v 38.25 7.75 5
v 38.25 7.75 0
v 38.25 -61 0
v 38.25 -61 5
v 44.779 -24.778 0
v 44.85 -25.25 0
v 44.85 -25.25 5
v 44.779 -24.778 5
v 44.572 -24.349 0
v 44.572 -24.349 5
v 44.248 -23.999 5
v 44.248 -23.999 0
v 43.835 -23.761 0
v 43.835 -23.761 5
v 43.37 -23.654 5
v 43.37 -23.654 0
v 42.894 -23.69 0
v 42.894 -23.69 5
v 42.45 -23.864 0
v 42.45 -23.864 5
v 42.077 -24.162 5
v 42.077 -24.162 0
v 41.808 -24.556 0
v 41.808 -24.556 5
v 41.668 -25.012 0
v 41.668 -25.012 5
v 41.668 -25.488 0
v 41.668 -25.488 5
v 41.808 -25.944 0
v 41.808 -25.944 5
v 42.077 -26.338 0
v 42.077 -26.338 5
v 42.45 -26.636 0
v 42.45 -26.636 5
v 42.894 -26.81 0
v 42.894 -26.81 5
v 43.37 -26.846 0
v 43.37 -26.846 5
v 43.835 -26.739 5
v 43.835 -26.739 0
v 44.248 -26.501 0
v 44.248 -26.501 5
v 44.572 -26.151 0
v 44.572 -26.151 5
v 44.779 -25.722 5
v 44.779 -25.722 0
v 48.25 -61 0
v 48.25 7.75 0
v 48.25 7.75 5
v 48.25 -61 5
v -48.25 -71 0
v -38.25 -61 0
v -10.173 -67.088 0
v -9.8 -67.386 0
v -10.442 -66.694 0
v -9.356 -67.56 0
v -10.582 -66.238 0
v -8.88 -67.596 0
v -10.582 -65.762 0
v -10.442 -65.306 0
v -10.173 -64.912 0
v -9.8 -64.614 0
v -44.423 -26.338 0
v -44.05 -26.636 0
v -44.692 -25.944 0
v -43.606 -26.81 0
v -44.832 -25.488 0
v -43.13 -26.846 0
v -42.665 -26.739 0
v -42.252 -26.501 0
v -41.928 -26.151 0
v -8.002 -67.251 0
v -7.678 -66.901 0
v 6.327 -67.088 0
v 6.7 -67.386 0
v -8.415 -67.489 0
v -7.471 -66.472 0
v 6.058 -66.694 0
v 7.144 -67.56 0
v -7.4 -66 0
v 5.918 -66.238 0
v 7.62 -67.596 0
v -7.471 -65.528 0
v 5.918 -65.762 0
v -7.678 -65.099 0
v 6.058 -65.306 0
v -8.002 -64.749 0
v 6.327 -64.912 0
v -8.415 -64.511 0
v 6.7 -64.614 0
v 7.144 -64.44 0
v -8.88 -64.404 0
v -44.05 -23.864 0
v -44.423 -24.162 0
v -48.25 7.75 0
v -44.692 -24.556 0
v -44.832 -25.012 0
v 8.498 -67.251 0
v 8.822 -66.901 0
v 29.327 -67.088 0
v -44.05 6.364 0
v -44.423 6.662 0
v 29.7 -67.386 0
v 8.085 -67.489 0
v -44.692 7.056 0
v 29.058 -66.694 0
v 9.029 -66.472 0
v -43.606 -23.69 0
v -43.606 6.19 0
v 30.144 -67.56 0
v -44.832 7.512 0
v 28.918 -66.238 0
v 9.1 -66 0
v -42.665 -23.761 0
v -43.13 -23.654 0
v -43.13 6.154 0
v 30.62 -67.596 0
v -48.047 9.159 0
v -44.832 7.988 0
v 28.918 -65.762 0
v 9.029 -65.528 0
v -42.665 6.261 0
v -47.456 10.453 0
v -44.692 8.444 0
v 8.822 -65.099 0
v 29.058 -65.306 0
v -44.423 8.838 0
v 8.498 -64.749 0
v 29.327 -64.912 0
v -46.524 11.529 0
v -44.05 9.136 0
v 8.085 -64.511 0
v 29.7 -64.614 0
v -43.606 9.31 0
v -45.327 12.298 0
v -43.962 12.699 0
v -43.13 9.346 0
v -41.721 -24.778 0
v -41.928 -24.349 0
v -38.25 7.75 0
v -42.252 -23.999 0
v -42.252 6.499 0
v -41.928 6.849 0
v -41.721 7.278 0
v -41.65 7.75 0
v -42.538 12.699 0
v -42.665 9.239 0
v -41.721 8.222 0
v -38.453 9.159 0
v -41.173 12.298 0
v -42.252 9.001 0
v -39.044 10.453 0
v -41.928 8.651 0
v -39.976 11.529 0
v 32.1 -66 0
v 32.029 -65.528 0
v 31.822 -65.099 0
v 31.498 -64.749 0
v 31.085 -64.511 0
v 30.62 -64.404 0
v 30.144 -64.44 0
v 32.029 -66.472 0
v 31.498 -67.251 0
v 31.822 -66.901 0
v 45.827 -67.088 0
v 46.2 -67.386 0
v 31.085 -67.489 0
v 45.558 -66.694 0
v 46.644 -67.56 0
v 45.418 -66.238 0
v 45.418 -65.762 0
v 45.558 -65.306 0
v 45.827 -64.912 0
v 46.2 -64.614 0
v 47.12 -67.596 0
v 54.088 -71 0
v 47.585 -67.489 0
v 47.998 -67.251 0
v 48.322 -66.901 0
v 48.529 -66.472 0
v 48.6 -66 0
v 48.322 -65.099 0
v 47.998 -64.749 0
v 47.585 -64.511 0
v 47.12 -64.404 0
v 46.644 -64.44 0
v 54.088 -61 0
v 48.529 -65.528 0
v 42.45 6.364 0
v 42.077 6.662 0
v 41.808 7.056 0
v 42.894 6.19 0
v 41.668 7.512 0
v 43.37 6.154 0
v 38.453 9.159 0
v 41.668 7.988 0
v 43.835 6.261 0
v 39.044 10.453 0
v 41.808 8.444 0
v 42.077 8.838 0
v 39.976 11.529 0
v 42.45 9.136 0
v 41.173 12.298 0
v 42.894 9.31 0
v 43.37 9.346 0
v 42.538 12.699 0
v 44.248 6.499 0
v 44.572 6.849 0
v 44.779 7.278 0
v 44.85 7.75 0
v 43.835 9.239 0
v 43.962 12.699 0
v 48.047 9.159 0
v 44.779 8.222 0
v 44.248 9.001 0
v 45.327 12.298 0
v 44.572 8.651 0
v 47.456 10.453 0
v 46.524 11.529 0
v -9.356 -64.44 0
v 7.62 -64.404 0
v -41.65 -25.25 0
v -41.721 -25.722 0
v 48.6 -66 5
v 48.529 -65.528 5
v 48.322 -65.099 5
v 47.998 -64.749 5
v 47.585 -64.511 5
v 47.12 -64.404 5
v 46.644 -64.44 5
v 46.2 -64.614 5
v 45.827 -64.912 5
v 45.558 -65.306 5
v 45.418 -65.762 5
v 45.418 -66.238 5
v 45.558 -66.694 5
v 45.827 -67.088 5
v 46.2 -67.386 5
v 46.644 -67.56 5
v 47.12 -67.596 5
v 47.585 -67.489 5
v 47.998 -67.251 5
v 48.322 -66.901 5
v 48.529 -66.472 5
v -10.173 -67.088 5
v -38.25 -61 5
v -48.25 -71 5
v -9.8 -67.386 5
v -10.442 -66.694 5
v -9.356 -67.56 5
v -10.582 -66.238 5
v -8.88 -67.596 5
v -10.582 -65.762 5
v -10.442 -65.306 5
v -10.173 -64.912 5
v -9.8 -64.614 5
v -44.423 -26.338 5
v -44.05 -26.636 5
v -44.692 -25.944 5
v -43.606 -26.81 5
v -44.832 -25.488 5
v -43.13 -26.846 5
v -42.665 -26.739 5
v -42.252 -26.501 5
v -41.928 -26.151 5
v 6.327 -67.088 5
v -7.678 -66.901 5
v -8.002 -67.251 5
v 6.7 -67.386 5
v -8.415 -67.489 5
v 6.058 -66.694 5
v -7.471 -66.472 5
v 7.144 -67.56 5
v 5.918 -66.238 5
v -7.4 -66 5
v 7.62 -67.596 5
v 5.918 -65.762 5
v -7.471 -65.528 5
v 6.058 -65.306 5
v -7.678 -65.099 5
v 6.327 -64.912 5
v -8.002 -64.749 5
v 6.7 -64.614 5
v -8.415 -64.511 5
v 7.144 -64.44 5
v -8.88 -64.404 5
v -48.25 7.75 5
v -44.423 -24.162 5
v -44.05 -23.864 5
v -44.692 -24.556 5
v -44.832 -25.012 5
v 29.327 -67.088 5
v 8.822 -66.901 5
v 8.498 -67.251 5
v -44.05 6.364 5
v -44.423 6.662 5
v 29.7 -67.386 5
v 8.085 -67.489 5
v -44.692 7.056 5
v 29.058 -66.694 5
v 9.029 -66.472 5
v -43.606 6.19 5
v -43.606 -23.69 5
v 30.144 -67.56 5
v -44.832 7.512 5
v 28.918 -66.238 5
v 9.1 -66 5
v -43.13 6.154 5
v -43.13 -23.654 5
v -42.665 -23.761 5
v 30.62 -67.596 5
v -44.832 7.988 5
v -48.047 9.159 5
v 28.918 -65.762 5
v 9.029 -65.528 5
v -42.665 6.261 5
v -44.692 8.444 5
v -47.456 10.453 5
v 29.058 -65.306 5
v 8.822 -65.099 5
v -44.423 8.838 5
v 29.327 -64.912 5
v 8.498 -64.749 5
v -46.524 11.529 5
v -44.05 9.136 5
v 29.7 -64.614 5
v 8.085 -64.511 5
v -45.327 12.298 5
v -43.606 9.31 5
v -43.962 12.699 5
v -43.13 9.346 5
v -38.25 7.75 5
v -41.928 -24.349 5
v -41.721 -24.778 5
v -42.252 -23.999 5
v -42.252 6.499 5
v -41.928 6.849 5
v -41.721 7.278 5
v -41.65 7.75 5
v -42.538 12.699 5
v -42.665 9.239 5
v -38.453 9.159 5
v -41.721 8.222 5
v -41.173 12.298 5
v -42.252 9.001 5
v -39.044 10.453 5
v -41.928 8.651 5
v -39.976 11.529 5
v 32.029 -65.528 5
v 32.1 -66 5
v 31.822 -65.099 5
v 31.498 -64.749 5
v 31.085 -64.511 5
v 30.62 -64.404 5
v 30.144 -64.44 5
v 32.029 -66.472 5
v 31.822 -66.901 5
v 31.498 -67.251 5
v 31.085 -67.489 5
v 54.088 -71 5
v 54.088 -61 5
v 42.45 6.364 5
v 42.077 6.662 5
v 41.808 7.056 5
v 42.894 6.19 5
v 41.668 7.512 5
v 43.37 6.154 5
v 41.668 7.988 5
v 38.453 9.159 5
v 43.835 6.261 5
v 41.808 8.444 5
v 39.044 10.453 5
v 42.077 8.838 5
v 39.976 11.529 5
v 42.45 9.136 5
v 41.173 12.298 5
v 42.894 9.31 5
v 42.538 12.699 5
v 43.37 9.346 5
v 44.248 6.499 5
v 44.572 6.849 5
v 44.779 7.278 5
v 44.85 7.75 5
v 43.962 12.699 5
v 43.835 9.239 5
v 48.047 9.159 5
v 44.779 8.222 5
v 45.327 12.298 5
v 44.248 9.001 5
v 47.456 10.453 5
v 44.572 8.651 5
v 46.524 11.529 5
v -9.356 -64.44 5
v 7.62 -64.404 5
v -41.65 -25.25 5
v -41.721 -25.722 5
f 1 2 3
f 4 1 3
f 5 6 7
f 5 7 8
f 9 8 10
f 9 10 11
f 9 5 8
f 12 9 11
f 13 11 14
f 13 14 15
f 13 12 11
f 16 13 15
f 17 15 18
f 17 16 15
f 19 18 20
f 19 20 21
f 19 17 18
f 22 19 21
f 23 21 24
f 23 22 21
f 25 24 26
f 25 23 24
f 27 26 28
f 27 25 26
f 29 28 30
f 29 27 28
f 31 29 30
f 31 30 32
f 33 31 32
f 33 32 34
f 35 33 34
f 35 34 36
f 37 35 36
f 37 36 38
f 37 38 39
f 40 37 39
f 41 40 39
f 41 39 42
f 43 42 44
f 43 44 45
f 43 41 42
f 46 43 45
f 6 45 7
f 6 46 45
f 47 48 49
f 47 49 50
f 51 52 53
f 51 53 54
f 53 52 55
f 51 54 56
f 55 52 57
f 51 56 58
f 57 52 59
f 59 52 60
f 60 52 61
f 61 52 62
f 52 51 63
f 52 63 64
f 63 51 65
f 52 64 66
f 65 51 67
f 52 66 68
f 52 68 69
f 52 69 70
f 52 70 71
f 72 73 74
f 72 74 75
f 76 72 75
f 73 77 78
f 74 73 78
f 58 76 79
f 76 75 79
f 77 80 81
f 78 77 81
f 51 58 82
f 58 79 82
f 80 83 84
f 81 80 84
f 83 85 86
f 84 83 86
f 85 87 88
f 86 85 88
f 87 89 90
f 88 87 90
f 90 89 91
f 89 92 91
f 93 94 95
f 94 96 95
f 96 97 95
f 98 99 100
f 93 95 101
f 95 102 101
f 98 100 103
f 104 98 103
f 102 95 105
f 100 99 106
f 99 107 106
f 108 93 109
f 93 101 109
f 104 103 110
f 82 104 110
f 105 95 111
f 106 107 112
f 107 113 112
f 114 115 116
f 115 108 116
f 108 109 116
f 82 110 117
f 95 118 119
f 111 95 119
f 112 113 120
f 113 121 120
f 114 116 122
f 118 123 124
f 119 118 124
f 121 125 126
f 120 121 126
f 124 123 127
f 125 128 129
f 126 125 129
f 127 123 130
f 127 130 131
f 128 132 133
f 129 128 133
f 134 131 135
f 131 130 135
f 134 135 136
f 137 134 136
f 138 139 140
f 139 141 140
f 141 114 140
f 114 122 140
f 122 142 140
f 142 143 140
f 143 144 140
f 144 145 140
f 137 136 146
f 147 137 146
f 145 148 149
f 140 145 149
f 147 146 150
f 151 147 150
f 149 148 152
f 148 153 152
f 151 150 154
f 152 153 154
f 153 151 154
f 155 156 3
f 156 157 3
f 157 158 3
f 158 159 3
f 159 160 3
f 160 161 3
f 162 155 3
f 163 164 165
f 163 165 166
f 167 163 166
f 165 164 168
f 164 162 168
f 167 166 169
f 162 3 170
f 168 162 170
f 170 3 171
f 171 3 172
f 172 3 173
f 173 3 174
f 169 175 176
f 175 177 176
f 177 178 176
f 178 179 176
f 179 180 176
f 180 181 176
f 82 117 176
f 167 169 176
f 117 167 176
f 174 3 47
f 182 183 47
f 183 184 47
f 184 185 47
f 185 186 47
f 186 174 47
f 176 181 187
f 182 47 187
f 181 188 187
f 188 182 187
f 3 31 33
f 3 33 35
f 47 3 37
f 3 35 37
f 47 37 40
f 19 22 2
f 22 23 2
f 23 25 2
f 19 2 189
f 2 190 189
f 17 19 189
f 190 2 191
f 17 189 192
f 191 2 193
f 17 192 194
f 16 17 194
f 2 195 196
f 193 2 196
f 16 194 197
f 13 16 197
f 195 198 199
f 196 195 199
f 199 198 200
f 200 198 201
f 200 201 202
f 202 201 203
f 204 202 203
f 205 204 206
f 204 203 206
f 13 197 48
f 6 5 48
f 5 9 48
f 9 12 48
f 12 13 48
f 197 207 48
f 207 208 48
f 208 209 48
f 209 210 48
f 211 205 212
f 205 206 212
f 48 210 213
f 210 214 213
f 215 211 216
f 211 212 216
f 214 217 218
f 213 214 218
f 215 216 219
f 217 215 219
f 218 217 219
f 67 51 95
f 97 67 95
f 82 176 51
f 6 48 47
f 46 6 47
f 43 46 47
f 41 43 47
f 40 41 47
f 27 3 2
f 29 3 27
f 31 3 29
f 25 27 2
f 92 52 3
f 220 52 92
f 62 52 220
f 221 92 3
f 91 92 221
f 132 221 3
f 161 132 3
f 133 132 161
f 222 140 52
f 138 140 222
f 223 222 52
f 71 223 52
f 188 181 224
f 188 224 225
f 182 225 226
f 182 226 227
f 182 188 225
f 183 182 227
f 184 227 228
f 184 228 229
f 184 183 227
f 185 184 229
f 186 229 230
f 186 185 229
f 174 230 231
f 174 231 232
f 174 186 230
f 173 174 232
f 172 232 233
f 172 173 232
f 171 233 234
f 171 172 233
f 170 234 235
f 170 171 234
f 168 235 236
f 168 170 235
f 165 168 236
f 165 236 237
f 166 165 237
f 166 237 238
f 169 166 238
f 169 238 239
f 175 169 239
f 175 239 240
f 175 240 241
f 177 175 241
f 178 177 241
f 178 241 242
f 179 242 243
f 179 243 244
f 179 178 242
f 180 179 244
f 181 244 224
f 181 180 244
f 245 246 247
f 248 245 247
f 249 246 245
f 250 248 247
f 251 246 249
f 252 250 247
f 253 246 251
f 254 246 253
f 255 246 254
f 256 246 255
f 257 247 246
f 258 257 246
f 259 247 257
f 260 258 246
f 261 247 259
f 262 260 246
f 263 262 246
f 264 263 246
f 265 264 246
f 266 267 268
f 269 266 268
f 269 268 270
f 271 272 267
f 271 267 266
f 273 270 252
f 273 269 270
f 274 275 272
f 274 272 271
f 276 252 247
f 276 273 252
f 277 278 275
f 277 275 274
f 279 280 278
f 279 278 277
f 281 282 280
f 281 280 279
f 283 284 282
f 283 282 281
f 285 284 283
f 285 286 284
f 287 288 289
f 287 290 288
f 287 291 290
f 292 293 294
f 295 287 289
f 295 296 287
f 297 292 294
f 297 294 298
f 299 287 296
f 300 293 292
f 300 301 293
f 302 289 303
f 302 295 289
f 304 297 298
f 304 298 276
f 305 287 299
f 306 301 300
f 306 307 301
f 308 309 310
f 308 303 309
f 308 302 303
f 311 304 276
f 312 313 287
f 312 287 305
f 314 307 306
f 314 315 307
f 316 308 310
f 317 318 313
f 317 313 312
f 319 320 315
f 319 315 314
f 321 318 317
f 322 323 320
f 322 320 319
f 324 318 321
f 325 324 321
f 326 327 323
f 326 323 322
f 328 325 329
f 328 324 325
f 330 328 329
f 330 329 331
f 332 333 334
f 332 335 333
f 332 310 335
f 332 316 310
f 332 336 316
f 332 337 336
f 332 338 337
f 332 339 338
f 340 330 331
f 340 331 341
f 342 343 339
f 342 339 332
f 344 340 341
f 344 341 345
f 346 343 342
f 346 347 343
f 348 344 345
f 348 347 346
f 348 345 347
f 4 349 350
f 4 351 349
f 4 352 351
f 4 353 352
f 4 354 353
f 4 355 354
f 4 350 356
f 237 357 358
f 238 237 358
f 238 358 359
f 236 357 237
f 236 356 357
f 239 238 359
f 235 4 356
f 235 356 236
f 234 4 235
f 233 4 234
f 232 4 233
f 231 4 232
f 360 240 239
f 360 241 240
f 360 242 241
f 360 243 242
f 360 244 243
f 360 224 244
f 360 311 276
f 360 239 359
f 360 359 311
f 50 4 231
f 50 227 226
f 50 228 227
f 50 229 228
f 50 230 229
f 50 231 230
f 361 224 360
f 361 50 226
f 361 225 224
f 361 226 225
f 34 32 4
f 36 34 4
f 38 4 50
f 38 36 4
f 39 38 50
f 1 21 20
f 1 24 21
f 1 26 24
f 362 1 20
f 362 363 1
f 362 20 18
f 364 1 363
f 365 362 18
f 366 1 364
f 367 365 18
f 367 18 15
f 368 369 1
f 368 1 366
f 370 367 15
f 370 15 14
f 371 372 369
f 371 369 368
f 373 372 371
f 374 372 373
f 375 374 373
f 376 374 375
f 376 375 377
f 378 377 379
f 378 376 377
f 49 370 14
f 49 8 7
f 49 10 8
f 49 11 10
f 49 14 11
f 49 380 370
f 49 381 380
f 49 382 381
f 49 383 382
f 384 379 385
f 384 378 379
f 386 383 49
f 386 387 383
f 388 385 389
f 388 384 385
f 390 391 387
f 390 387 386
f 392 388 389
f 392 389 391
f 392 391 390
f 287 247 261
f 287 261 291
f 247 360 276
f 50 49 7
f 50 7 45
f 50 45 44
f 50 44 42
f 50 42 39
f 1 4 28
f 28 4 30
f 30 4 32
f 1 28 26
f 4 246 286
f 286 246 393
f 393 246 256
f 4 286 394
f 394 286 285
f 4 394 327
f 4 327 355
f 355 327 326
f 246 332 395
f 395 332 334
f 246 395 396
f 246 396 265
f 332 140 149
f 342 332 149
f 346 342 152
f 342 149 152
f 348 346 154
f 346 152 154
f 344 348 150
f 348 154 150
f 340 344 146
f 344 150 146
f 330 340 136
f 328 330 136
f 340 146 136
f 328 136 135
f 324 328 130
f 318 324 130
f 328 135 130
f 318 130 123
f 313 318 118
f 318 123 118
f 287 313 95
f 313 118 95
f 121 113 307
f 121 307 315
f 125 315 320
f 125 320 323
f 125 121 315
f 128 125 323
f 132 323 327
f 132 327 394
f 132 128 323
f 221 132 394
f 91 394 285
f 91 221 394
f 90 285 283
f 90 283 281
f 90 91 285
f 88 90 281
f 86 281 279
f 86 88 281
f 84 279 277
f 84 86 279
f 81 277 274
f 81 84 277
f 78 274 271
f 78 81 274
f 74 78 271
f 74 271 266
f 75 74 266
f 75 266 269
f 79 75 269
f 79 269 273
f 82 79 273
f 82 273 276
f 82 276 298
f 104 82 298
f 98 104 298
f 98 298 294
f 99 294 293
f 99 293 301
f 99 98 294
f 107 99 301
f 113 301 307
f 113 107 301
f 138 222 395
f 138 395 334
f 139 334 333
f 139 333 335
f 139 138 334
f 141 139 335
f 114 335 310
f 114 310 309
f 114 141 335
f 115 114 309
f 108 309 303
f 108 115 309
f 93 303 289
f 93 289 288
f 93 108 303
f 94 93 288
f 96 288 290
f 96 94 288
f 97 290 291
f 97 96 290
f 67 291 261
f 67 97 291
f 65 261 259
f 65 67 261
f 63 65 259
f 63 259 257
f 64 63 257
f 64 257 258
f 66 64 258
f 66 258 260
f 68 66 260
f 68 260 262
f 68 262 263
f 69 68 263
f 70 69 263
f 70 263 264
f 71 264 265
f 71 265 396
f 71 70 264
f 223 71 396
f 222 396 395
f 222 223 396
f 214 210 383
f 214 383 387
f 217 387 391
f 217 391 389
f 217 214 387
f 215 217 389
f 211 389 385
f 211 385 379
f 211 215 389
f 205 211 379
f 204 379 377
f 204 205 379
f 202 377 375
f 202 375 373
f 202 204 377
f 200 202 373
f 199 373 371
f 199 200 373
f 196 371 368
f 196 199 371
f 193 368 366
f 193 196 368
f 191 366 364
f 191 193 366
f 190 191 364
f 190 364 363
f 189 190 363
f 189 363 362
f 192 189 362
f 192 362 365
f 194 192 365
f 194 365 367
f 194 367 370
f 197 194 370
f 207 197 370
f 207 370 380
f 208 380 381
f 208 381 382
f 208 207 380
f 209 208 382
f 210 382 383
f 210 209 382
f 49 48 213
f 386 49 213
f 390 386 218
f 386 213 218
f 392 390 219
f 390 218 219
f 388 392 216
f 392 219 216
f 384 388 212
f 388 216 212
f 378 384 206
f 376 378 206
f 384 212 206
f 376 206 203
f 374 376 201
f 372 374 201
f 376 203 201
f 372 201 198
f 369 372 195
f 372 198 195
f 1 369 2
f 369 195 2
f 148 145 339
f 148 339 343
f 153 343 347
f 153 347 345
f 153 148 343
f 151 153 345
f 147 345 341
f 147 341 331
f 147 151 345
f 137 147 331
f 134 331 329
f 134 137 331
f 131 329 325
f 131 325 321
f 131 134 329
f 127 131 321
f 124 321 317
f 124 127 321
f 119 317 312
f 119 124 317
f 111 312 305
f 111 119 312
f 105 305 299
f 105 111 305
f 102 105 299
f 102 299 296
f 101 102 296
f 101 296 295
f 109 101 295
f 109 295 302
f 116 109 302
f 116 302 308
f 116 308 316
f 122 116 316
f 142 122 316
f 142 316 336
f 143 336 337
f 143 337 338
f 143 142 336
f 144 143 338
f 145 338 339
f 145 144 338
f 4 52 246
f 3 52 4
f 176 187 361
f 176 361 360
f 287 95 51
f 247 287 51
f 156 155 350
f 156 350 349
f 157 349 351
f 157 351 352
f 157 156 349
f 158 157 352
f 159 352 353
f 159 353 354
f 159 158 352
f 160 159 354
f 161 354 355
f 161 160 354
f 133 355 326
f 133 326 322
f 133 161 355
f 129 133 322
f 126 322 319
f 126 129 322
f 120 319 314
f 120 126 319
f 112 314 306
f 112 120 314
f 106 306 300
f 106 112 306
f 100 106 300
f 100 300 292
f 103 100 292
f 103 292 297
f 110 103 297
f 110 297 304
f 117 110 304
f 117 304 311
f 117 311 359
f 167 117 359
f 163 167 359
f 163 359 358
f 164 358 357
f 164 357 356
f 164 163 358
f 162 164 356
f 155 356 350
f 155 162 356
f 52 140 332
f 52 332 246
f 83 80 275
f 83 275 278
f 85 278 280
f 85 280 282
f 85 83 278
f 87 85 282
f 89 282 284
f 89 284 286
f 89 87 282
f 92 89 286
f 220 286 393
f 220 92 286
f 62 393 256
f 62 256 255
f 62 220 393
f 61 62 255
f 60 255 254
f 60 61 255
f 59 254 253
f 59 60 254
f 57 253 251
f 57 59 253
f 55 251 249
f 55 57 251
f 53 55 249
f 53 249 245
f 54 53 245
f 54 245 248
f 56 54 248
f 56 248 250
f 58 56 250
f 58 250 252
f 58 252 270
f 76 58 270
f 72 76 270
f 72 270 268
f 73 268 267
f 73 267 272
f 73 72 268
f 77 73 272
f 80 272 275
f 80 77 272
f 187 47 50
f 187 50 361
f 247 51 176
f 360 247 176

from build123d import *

# Parameters (mm, degrees)
SKETCH_R  = 1.6
PAD_DEPTH = 5


with BuildPart() as part:
    # Sketch → Pad (new body)
    with BuildSketch(Plane.XY):
        with BuildLine():
            ThreePointArc((-38.25, 7.75), (-43.25, 12.75), (-48.25, 7.75))
            Line((-48.25, 7.75), (-48.25, -71))
            Line((-48.25, -71), (54.088146, -71))
            Line((54.088146, -61), (54.088146, -71))
            Line((48.25, -61), (54.088146, -61))
            Line((48.25, 7.75), (48.25, -61))
            ThreePointArc((48.25, 7.75), (43.25, 12.75), (38.25, 7.75))
            Line((38.25, 7.75), (38.25, -61))
            Line((-38.25, -61), (38.25, -61))
            Line((-38.25, 7.75), (-38.25, -61))
        make_face()
        with Locations((-43.25, 7.75)):
            Circle(SKETCH_R, mode=Mode.SUBTRACT)
        with Locations((43.25, 7.75)):
            Circle(SKETCH_R, mode=Mode.SUBTRACT)
        with Locations((-43.25, -25.25)):
            Circle(SKETCH_R, mode=Mode.SUBTRACT)
        with Locations((43.25, -25.25)):
            Circle(SKETCH_R, mode=Mode.SUBTRACT)
        with Locations((7.5, -66)):
            Circle(SKETCH_R, mode=Mode.SUBTRACT)
        with Locations((-9, -66)):
            Circle(SKETCH_R, mode=Mode.SUBTRACT)
        with Locations((30.5, -66)):
            Circle(SKETCH_R, mode=Mode.SUBTRACT)
        with Locations((47, -66)):
            Circle(SKETCH_R, mode=Mode.SUBTRACT)
    extrude(amount=PAD_DEPTH)


solid = part.part
